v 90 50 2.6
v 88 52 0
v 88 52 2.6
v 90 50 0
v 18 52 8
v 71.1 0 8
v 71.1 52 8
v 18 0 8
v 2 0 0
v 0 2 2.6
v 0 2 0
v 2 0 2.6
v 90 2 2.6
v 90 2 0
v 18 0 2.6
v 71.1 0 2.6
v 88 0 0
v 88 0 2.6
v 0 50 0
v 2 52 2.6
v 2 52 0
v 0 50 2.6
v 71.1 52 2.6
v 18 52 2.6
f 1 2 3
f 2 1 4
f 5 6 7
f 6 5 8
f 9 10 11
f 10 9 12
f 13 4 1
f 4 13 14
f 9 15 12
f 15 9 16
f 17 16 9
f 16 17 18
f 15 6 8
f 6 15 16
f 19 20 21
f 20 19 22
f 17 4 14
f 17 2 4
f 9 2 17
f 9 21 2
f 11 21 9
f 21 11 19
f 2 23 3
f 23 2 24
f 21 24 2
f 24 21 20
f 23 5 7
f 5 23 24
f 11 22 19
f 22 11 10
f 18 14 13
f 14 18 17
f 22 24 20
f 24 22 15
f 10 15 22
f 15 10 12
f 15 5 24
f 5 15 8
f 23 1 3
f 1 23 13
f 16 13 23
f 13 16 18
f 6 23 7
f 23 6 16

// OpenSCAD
$fn = 32;

// ----------------------------------------------------------------------
// Stepped bar: centerstep, 90 x 52 x 8/2.6 mm
// ----------------------------------------------------------------------

// --- parameters (mm) ---
bar_l = 90;               // bar length, X
bar_w = 52;               // bar width, Y
plate_t = 8;              // thickness of the thick zone, Z
thin_t = 2.6;             // thickness of the thin zone
corner_c = 2;             // corner chamfer of the bar
step_cut = 5.4;           // material removed from the thin zone
thick_from = 18;          // start of the thick middle zone
thick_to = 71.1;          // end of the thick middle zone
depth_1 = 5.4;            // depth of cut 1 from the top face
depth_2 = 5.4;            // depth of cut 2 from the top face

profile = [[2, 0], [88, 0], [90, 2], [90, 50], [88, 52], [2, 52], [0, 50], [0, 2]];  // primary outline, 8 points, counter clockwise
void_1 = [[-1, -1], [18, -1], [18, 53], [-1, 53]];  // thin left end, 4 points
void_2 = [[71.1, -1], [91, -1], [91, 53], [71.1, 53]];  // thin right end, 4 points

// --- the one profile operation ---
difference() {
  linear_extrude(height = plate_t) polygon(points = profile);
  translate([0, 0, plate_t - depth_1])
    linear_extrude(height = depth_1 + 1) polygon(points = void_1);
  translate([0, 0, plate_t - depth_2])
    linear_extrude(height = depth_2 + 1) polygon(points = void_2);
}
